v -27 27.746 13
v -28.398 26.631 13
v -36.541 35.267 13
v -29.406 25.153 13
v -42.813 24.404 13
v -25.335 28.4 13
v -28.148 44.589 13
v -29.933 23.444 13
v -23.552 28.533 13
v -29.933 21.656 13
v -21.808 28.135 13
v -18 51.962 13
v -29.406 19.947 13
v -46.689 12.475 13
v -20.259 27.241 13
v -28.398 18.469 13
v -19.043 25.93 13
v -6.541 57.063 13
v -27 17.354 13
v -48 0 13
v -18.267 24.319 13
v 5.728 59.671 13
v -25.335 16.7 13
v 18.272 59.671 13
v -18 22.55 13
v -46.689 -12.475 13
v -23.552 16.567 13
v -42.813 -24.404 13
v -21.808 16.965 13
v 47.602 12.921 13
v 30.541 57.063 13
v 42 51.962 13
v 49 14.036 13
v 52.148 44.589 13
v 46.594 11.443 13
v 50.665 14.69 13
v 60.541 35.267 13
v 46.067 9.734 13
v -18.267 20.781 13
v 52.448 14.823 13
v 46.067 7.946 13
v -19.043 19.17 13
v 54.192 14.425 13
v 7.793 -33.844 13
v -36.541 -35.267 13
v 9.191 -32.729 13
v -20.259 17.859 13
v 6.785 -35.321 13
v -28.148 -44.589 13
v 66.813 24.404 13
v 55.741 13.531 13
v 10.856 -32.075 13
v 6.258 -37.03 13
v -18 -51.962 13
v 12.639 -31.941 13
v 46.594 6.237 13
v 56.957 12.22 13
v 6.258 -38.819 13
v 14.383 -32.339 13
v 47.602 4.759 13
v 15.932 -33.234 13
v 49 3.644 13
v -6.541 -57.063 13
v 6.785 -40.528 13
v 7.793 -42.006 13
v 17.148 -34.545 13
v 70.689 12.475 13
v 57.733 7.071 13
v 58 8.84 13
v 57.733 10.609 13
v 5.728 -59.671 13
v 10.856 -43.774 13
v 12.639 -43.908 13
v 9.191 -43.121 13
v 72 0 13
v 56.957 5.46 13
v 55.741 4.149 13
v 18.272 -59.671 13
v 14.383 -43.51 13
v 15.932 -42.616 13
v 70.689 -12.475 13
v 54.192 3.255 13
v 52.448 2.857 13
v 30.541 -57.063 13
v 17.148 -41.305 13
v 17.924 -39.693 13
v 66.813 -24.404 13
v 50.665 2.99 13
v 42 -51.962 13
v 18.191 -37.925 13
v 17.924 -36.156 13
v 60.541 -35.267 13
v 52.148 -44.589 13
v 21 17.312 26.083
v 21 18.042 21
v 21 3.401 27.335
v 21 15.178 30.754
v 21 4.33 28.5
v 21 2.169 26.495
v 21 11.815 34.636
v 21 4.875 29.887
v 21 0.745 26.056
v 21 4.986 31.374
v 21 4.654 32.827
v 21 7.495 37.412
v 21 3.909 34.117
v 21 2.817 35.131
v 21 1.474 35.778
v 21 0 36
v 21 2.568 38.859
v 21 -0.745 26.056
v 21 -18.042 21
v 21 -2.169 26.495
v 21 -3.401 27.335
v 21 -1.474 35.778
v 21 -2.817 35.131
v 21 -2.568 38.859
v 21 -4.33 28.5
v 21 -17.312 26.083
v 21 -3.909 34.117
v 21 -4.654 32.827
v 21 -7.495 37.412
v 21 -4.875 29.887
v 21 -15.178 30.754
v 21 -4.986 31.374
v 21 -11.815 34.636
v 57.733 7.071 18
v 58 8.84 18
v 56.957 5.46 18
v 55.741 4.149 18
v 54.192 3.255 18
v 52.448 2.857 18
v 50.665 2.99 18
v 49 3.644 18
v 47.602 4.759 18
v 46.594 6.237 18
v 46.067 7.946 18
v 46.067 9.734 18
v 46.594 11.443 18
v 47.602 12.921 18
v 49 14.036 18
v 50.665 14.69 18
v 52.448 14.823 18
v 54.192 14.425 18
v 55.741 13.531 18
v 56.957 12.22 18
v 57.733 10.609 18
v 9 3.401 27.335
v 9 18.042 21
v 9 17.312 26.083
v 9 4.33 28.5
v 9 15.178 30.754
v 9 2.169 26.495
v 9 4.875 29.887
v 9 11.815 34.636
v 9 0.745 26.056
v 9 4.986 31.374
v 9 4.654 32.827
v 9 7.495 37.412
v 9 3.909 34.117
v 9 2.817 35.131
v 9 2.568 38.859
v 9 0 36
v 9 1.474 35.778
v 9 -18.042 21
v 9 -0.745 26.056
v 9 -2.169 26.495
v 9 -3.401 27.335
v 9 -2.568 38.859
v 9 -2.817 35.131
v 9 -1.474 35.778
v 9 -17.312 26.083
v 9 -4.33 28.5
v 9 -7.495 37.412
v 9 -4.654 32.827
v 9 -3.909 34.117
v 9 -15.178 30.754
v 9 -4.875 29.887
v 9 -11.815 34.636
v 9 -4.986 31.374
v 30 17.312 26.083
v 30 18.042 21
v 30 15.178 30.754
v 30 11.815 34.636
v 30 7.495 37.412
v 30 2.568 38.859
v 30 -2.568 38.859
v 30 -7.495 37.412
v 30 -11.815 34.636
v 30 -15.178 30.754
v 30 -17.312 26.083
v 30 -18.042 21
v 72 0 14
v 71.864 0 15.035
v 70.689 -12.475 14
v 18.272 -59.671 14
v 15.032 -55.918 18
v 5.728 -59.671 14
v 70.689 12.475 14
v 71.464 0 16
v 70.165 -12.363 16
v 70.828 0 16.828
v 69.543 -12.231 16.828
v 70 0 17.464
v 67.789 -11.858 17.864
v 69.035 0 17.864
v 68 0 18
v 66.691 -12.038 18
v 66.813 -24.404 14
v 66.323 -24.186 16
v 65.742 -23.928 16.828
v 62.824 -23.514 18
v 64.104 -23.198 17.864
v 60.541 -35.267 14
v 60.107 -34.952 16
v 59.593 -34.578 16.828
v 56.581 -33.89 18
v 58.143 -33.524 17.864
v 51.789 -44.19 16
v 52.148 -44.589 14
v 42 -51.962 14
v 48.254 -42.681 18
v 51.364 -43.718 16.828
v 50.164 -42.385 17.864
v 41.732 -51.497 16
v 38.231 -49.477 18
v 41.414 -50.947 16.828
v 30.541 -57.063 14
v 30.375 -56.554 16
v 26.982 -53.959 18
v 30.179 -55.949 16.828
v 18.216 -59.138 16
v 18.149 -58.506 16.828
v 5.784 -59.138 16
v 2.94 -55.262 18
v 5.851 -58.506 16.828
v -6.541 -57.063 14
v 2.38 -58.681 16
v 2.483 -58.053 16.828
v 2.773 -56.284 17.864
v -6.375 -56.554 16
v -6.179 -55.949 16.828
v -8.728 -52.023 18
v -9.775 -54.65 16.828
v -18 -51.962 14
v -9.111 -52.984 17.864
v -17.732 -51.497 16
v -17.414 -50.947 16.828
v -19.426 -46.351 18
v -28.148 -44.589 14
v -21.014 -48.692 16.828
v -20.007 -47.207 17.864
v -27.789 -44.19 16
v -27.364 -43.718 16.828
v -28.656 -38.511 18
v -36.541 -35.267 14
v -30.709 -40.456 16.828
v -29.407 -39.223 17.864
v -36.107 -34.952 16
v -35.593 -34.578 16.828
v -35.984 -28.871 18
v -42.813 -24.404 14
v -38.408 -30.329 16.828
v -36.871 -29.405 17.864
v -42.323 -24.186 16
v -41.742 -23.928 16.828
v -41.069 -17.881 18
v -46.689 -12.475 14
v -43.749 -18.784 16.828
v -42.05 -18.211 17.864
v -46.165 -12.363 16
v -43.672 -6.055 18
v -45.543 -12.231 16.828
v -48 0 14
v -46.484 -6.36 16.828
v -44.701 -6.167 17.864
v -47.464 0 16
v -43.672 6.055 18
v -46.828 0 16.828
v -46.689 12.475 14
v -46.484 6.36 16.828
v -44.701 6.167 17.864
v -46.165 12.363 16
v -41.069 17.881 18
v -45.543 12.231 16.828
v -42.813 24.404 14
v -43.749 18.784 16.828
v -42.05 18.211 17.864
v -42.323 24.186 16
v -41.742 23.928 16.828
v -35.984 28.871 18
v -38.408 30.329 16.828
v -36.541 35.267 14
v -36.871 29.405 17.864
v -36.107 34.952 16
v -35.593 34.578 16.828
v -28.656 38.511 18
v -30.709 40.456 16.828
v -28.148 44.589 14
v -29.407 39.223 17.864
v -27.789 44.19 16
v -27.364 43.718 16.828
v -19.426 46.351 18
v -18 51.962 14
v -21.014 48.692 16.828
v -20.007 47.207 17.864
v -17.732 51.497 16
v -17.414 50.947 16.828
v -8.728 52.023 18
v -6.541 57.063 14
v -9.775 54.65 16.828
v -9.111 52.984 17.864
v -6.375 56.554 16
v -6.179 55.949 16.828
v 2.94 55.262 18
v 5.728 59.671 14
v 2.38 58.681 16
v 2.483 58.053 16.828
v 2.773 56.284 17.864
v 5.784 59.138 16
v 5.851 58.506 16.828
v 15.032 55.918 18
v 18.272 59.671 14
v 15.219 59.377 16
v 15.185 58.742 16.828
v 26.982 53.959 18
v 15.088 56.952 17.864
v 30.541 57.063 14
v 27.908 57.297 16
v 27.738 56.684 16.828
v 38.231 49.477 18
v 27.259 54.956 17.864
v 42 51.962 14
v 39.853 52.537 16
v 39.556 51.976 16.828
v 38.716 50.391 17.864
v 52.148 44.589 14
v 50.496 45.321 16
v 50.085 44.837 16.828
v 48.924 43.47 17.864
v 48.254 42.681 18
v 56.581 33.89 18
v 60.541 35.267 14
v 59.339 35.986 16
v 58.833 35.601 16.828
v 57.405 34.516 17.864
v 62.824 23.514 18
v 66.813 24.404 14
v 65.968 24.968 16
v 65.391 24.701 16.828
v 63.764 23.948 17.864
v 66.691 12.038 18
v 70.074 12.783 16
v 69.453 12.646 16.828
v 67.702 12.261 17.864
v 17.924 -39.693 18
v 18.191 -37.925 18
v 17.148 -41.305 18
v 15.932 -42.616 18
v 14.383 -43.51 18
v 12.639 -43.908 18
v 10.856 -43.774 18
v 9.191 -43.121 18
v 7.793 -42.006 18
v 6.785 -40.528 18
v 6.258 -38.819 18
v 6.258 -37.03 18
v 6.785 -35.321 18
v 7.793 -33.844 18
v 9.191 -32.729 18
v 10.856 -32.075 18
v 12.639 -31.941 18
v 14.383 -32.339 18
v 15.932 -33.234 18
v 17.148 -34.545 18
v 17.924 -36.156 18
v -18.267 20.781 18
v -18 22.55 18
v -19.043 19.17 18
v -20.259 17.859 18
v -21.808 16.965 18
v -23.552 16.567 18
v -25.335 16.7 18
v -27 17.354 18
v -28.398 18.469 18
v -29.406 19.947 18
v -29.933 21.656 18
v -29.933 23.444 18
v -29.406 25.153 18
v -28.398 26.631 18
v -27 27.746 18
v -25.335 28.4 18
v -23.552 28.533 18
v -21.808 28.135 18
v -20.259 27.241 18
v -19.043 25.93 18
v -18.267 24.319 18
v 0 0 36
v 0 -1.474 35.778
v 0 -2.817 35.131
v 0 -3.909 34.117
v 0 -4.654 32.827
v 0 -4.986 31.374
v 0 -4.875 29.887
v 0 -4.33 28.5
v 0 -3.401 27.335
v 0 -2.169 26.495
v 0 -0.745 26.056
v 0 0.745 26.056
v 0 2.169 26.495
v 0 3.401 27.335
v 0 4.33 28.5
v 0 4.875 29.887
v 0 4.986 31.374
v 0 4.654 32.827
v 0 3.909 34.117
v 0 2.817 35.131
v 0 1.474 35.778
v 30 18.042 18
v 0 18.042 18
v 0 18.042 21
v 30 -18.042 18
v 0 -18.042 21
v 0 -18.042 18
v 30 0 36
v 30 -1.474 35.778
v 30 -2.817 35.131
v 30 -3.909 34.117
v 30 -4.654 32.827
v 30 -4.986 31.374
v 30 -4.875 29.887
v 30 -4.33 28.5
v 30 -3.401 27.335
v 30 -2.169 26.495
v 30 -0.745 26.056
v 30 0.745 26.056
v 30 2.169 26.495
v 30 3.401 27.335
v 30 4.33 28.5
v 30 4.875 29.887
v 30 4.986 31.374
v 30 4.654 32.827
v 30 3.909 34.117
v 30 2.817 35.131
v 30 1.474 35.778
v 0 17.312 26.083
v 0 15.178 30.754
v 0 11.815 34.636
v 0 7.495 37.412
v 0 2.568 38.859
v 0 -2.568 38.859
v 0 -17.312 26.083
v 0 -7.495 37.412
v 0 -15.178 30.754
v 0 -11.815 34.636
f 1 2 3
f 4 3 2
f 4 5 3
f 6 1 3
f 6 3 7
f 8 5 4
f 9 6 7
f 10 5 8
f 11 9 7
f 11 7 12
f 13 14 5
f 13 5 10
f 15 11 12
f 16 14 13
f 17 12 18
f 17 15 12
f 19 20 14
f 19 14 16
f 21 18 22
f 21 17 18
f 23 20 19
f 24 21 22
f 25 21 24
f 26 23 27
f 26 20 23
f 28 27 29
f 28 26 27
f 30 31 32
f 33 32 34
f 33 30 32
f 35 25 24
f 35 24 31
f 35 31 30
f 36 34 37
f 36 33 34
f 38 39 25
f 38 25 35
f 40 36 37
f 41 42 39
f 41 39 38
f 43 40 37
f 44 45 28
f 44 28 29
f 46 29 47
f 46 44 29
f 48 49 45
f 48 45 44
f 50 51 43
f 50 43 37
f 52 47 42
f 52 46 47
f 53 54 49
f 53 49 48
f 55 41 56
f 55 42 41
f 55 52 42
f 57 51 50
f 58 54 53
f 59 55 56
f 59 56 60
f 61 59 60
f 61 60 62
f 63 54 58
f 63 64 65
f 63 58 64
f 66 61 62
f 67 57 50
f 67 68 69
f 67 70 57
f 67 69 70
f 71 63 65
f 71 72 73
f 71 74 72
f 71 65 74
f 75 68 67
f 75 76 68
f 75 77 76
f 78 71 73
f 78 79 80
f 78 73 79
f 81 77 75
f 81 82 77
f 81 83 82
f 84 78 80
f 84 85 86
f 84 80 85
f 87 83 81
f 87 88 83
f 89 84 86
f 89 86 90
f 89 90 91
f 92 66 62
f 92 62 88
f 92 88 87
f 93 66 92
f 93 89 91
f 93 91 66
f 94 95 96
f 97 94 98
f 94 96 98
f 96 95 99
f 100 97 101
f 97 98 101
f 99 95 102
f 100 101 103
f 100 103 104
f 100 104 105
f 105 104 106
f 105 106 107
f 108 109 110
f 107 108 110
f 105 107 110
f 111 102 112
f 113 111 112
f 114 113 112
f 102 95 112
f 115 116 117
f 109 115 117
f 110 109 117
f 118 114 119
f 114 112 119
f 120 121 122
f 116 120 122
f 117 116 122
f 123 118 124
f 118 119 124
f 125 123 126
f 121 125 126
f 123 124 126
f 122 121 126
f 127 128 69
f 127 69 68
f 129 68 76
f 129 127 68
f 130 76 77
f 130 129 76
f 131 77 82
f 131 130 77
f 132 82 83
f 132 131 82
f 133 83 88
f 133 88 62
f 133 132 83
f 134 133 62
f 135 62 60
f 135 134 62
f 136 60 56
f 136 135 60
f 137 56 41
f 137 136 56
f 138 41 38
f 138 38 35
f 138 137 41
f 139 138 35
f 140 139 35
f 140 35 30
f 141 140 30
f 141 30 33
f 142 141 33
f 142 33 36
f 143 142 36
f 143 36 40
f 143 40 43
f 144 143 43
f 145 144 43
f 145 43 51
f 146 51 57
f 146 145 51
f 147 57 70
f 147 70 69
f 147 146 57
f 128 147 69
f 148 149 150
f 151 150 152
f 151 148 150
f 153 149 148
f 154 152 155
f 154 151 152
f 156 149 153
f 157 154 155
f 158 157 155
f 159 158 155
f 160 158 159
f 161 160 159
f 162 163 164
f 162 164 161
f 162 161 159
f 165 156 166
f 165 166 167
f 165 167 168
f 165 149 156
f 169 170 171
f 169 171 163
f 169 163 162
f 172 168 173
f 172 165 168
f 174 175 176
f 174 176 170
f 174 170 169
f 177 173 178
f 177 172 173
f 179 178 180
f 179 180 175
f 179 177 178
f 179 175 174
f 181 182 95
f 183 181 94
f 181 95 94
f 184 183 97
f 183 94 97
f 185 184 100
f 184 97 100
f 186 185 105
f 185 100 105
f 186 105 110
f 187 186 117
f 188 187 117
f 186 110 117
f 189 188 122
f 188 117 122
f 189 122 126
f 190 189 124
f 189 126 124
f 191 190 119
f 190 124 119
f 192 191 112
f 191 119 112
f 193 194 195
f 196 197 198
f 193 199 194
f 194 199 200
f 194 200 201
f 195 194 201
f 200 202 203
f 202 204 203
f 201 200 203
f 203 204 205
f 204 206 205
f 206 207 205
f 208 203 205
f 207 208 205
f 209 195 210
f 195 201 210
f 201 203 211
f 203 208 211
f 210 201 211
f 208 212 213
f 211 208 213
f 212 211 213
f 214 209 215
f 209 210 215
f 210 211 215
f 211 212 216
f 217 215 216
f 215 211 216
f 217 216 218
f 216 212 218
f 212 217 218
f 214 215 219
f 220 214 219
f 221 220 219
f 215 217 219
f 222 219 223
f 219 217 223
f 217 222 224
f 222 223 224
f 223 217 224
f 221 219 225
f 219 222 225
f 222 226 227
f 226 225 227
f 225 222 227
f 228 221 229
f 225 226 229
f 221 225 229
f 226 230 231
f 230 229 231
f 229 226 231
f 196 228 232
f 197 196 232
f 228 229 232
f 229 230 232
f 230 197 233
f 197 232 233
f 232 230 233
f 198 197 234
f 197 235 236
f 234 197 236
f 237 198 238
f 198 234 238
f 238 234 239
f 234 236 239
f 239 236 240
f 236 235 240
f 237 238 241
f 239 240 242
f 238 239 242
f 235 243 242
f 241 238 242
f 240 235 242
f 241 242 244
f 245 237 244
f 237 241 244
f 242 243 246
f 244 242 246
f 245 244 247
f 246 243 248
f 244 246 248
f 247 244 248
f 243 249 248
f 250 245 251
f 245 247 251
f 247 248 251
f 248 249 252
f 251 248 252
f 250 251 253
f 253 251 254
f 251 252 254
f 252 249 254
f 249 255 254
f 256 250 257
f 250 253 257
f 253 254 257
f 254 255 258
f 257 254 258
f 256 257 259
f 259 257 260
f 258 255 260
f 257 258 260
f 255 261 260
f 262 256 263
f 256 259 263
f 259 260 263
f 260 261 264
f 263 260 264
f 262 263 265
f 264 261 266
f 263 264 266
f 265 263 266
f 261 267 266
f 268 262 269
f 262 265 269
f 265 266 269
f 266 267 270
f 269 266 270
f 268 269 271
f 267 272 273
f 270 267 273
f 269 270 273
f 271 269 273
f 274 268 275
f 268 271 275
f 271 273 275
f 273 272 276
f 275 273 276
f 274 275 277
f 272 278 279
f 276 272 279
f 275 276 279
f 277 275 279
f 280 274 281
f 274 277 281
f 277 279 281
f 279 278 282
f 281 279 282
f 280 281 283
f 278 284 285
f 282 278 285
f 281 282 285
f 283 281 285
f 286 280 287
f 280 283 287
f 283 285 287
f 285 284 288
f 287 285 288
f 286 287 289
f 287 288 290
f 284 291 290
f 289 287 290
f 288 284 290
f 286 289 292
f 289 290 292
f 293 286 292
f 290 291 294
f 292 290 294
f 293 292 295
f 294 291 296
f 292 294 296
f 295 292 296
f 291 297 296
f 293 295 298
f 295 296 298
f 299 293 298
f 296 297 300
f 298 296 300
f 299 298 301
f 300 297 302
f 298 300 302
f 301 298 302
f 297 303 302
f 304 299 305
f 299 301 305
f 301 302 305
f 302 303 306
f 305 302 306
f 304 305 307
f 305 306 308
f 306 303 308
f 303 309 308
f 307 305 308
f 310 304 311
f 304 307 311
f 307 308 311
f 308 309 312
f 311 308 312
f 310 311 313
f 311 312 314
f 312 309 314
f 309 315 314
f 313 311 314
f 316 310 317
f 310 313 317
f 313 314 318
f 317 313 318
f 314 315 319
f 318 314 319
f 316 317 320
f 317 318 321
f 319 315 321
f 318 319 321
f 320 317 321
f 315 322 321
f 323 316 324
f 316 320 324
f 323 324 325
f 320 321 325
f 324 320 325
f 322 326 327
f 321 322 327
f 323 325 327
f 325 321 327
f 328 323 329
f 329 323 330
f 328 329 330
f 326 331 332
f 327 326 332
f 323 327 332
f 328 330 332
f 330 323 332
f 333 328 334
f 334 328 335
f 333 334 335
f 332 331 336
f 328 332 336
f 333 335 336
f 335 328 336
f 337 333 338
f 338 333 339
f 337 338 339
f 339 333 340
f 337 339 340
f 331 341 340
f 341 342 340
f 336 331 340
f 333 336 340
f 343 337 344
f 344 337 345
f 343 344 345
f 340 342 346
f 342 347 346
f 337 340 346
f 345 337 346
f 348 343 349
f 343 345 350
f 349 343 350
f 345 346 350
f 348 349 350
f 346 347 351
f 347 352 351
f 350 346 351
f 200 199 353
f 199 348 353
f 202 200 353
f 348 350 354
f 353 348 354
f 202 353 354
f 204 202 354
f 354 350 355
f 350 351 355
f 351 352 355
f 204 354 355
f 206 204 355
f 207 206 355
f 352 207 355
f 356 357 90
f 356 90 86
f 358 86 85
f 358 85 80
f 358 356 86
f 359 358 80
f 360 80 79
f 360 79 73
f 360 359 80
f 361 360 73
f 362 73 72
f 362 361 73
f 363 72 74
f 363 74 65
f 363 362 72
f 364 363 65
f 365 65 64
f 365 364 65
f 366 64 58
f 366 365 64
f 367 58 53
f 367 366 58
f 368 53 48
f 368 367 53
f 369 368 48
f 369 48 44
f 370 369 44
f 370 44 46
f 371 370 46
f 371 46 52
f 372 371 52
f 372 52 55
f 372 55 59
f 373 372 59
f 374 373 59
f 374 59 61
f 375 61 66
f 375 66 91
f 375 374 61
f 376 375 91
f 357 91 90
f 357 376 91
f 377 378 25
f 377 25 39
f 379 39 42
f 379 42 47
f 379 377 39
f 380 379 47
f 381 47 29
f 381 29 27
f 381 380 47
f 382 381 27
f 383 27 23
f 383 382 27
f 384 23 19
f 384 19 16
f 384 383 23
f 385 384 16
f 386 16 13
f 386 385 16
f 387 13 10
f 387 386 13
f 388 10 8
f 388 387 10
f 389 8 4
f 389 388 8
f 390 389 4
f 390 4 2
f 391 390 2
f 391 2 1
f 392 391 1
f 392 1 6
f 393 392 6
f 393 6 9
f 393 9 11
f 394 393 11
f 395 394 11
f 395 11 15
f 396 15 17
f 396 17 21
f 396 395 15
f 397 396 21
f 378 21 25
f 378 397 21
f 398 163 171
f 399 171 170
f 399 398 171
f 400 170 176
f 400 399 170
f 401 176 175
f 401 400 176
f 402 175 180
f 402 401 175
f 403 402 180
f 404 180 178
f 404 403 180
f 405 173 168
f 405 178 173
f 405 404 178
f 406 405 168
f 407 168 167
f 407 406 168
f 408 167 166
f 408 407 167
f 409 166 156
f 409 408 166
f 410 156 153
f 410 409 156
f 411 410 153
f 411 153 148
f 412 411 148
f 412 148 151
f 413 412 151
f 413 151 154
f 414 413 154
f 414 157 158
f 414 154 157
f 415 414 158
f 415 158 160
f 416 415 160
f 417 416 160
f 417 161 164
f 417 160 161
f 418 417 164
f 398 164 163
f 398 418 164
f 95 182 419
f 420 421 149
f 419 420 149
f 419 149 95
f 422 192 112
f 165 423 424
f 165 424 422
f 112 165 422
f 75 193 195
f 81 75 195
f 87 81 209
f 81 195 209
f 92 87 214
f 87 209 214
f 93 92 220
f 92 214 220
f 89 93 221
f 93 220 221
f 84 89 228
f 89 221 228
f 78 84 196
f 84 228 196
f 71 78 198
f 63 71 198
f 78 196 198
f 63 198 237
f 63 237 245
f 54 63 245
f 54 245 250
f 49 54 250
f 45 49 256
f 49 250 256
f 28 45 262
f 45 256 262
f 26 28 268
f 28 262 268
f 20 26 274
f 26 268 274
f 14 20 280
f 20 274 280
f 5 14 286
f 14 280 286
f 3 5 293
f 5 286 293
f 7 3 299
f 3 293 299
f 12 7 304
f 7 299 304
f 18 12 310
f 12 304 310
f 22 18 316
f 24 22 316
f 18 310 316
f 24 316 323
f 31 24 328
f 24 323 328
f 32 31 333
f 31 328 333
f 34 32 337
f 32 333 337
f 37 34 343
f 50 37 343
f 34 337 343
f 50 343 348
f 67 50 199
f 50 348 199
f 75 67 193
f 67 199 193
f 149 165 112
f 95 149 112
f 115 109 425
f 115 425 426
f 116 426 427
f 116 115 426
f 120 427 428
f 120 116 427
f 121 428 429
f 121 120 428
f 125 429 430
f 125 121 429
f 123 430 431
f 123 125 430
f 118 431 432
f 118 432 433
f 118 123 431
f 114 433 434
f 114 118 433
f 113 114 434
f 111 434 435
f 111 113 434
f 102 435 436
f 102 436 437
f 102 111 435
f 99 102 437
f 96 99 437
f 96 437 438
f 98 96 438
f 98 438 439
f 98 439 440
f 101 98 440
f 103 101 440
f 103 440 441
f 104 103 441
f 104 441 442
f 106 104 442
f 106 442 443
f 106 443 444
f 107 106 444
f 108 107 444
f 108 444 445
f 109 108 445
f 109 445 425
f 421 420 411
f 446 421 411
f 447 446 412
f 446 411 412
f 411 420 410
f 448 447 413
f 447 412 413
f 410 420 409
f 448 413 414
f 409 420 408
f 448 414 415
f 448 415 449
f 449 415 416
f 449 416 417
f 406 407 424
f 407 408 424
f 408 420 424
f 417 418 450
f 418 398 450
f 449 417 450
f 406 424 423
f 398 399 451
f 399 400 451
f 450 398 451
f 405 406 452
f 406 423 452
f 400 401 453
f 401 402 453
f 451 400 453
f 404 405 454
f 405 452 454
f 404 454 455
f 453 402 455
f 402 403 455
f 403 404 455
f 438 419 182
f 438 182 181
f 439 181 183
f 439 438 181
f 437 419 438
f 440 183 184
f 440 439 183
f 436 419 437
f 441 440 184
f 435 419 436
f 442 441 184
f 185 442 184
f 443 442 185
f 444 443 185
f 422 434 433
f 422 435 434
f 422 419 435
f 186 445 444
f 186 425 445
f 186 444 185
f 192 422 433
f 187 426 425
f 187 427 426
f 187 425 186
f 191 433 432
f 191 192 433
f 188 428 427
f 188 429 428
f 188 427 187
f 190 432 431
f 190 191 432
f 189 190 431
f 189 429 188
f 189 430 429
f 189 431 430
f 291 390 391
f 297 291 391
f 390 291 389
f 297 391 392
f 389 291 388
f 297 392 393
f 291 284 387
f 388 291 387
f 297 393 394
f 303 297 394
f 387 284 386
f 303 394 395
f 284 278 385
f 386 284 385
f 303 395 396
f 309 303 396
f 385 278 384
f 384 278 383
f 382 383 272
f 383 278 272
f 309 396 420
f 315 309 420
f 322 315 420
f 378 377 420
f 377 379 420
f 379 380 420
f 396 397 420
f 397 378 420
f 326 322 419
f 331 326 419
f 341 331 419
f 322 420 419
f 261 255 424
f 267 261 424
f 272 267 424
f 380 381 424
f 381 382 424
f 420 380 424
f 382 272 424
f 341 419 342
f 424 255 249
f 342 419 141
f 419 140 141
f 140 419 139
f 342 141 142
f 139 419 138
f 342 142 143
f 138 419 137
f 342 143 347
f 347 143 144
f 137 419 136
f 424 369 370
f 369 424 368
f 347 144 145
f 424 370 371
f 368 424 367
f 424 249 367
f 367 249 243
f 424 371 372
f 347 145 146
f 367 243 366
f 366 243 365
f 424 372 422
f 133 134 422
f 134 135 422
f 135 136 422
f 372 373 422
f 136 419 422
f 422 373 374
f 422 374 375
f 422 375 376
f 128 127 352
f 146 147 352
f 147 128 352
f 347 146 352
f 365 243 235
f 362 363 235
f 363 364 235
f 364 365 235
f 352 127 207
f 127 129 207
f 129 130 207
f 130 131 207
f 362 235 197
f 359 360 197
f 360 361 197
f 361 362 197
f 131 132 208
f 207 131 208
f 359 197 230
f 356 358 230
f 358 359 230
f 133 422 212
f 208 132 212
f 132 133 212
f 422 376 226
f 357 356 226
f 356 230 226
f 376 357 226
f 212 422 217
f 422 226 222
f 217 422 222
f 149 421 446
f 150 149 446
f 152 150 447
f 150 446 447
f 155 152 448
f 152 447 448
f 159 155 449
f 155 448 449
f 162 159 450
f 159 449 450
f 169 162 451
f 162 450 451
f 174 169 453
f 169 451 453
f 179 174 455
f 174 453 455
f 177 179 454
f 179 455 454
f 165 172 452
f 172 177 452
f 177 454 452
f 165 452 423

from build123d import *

# Parameters (mm, degrees)
SKETCH008_R        = 5
PAD003_DEPTH       = 30
SKETCH009_W        = 12
SKETCH009_H        = 21.7
POCKET002_DEPTH    = 20
SKETCH010_R        = 60
SKETCH010_R_2      = 6
PAD004_DEPTH       = 5
FILLET_R           = 4
BODY004_ROLL_ANGLE = 90


with BuildPart() as part:
    # Sketch008 → Pad003 (new body)
    with BuildSketch(Plane.YZ):
        with BuildLine():
            ThreePointArc((0, -18.042356), (18.042356, 0), (0, 18.042356))
            Line((0, 18.042356), (-5.957898, 18.042356))
            Line((-5.957898, -18.042356), (-5.957898, 18.042356))
            Line((0, -18.042356), (-5.957898, -18.042356))
        make_face()
        with Locations((10, 0)):
            Circle(SKETCH008_R, mode=Mode.SUBTRACT)
    extrude(amount=PAD003_DEPTH)

    # Sketch009 → Pocket002 (cut, symmetric)
    with BuildSketch(Plane.XY):
        with Locations((15, 10.85)):
            Rectangle(SKETCH009_W, SKETCH009_H)
    extrude(amount=POCKET002_DEPTH, both=True, mode=Mode.SUBTRACT)

    # Sketch010 → Pad004 (join)
    with BuildSketch(Plane(origin=(12, -3, 0), x_dir=(1, 0, 0), z_dir=(0, -1, 0))):
        Circle(SKETCH010_R)
        with Locations((0.190896, 37.924703)):
            Circle(SKETCH010_R_2, mode=Mode.SUBTRACT)
        with Locations((-36, -22.55)):
            Circle(SKETCH010_R_2, mode=Mode.SUBTRACT)
        with Locations((40, -8.84)):
            Circle(SKETCH010_R_2, mode=Mode.SUBTRACT)
    extrude(amount=PAD004_DEPTH)

    # Fillet
    fillet_edges = [part.edges().sort_by_distance(p)[0] for p in [
        (-48, -3, 0),
    ]]
    fillet(fillet_edges, radius=FILLET_R)


with BuildPart() as part_1:
    # Body004 roll: moved
    add(part.part.rotate(Axis((0, 0, 0), (1, 0, 0)), BODY004_ROLL_ANGLE))


with BuildPart() as part_2:
    # Body004 placement: moved
    add(part_1.part.moved(Location((0, 0, 21))))


solid = part_2.part
